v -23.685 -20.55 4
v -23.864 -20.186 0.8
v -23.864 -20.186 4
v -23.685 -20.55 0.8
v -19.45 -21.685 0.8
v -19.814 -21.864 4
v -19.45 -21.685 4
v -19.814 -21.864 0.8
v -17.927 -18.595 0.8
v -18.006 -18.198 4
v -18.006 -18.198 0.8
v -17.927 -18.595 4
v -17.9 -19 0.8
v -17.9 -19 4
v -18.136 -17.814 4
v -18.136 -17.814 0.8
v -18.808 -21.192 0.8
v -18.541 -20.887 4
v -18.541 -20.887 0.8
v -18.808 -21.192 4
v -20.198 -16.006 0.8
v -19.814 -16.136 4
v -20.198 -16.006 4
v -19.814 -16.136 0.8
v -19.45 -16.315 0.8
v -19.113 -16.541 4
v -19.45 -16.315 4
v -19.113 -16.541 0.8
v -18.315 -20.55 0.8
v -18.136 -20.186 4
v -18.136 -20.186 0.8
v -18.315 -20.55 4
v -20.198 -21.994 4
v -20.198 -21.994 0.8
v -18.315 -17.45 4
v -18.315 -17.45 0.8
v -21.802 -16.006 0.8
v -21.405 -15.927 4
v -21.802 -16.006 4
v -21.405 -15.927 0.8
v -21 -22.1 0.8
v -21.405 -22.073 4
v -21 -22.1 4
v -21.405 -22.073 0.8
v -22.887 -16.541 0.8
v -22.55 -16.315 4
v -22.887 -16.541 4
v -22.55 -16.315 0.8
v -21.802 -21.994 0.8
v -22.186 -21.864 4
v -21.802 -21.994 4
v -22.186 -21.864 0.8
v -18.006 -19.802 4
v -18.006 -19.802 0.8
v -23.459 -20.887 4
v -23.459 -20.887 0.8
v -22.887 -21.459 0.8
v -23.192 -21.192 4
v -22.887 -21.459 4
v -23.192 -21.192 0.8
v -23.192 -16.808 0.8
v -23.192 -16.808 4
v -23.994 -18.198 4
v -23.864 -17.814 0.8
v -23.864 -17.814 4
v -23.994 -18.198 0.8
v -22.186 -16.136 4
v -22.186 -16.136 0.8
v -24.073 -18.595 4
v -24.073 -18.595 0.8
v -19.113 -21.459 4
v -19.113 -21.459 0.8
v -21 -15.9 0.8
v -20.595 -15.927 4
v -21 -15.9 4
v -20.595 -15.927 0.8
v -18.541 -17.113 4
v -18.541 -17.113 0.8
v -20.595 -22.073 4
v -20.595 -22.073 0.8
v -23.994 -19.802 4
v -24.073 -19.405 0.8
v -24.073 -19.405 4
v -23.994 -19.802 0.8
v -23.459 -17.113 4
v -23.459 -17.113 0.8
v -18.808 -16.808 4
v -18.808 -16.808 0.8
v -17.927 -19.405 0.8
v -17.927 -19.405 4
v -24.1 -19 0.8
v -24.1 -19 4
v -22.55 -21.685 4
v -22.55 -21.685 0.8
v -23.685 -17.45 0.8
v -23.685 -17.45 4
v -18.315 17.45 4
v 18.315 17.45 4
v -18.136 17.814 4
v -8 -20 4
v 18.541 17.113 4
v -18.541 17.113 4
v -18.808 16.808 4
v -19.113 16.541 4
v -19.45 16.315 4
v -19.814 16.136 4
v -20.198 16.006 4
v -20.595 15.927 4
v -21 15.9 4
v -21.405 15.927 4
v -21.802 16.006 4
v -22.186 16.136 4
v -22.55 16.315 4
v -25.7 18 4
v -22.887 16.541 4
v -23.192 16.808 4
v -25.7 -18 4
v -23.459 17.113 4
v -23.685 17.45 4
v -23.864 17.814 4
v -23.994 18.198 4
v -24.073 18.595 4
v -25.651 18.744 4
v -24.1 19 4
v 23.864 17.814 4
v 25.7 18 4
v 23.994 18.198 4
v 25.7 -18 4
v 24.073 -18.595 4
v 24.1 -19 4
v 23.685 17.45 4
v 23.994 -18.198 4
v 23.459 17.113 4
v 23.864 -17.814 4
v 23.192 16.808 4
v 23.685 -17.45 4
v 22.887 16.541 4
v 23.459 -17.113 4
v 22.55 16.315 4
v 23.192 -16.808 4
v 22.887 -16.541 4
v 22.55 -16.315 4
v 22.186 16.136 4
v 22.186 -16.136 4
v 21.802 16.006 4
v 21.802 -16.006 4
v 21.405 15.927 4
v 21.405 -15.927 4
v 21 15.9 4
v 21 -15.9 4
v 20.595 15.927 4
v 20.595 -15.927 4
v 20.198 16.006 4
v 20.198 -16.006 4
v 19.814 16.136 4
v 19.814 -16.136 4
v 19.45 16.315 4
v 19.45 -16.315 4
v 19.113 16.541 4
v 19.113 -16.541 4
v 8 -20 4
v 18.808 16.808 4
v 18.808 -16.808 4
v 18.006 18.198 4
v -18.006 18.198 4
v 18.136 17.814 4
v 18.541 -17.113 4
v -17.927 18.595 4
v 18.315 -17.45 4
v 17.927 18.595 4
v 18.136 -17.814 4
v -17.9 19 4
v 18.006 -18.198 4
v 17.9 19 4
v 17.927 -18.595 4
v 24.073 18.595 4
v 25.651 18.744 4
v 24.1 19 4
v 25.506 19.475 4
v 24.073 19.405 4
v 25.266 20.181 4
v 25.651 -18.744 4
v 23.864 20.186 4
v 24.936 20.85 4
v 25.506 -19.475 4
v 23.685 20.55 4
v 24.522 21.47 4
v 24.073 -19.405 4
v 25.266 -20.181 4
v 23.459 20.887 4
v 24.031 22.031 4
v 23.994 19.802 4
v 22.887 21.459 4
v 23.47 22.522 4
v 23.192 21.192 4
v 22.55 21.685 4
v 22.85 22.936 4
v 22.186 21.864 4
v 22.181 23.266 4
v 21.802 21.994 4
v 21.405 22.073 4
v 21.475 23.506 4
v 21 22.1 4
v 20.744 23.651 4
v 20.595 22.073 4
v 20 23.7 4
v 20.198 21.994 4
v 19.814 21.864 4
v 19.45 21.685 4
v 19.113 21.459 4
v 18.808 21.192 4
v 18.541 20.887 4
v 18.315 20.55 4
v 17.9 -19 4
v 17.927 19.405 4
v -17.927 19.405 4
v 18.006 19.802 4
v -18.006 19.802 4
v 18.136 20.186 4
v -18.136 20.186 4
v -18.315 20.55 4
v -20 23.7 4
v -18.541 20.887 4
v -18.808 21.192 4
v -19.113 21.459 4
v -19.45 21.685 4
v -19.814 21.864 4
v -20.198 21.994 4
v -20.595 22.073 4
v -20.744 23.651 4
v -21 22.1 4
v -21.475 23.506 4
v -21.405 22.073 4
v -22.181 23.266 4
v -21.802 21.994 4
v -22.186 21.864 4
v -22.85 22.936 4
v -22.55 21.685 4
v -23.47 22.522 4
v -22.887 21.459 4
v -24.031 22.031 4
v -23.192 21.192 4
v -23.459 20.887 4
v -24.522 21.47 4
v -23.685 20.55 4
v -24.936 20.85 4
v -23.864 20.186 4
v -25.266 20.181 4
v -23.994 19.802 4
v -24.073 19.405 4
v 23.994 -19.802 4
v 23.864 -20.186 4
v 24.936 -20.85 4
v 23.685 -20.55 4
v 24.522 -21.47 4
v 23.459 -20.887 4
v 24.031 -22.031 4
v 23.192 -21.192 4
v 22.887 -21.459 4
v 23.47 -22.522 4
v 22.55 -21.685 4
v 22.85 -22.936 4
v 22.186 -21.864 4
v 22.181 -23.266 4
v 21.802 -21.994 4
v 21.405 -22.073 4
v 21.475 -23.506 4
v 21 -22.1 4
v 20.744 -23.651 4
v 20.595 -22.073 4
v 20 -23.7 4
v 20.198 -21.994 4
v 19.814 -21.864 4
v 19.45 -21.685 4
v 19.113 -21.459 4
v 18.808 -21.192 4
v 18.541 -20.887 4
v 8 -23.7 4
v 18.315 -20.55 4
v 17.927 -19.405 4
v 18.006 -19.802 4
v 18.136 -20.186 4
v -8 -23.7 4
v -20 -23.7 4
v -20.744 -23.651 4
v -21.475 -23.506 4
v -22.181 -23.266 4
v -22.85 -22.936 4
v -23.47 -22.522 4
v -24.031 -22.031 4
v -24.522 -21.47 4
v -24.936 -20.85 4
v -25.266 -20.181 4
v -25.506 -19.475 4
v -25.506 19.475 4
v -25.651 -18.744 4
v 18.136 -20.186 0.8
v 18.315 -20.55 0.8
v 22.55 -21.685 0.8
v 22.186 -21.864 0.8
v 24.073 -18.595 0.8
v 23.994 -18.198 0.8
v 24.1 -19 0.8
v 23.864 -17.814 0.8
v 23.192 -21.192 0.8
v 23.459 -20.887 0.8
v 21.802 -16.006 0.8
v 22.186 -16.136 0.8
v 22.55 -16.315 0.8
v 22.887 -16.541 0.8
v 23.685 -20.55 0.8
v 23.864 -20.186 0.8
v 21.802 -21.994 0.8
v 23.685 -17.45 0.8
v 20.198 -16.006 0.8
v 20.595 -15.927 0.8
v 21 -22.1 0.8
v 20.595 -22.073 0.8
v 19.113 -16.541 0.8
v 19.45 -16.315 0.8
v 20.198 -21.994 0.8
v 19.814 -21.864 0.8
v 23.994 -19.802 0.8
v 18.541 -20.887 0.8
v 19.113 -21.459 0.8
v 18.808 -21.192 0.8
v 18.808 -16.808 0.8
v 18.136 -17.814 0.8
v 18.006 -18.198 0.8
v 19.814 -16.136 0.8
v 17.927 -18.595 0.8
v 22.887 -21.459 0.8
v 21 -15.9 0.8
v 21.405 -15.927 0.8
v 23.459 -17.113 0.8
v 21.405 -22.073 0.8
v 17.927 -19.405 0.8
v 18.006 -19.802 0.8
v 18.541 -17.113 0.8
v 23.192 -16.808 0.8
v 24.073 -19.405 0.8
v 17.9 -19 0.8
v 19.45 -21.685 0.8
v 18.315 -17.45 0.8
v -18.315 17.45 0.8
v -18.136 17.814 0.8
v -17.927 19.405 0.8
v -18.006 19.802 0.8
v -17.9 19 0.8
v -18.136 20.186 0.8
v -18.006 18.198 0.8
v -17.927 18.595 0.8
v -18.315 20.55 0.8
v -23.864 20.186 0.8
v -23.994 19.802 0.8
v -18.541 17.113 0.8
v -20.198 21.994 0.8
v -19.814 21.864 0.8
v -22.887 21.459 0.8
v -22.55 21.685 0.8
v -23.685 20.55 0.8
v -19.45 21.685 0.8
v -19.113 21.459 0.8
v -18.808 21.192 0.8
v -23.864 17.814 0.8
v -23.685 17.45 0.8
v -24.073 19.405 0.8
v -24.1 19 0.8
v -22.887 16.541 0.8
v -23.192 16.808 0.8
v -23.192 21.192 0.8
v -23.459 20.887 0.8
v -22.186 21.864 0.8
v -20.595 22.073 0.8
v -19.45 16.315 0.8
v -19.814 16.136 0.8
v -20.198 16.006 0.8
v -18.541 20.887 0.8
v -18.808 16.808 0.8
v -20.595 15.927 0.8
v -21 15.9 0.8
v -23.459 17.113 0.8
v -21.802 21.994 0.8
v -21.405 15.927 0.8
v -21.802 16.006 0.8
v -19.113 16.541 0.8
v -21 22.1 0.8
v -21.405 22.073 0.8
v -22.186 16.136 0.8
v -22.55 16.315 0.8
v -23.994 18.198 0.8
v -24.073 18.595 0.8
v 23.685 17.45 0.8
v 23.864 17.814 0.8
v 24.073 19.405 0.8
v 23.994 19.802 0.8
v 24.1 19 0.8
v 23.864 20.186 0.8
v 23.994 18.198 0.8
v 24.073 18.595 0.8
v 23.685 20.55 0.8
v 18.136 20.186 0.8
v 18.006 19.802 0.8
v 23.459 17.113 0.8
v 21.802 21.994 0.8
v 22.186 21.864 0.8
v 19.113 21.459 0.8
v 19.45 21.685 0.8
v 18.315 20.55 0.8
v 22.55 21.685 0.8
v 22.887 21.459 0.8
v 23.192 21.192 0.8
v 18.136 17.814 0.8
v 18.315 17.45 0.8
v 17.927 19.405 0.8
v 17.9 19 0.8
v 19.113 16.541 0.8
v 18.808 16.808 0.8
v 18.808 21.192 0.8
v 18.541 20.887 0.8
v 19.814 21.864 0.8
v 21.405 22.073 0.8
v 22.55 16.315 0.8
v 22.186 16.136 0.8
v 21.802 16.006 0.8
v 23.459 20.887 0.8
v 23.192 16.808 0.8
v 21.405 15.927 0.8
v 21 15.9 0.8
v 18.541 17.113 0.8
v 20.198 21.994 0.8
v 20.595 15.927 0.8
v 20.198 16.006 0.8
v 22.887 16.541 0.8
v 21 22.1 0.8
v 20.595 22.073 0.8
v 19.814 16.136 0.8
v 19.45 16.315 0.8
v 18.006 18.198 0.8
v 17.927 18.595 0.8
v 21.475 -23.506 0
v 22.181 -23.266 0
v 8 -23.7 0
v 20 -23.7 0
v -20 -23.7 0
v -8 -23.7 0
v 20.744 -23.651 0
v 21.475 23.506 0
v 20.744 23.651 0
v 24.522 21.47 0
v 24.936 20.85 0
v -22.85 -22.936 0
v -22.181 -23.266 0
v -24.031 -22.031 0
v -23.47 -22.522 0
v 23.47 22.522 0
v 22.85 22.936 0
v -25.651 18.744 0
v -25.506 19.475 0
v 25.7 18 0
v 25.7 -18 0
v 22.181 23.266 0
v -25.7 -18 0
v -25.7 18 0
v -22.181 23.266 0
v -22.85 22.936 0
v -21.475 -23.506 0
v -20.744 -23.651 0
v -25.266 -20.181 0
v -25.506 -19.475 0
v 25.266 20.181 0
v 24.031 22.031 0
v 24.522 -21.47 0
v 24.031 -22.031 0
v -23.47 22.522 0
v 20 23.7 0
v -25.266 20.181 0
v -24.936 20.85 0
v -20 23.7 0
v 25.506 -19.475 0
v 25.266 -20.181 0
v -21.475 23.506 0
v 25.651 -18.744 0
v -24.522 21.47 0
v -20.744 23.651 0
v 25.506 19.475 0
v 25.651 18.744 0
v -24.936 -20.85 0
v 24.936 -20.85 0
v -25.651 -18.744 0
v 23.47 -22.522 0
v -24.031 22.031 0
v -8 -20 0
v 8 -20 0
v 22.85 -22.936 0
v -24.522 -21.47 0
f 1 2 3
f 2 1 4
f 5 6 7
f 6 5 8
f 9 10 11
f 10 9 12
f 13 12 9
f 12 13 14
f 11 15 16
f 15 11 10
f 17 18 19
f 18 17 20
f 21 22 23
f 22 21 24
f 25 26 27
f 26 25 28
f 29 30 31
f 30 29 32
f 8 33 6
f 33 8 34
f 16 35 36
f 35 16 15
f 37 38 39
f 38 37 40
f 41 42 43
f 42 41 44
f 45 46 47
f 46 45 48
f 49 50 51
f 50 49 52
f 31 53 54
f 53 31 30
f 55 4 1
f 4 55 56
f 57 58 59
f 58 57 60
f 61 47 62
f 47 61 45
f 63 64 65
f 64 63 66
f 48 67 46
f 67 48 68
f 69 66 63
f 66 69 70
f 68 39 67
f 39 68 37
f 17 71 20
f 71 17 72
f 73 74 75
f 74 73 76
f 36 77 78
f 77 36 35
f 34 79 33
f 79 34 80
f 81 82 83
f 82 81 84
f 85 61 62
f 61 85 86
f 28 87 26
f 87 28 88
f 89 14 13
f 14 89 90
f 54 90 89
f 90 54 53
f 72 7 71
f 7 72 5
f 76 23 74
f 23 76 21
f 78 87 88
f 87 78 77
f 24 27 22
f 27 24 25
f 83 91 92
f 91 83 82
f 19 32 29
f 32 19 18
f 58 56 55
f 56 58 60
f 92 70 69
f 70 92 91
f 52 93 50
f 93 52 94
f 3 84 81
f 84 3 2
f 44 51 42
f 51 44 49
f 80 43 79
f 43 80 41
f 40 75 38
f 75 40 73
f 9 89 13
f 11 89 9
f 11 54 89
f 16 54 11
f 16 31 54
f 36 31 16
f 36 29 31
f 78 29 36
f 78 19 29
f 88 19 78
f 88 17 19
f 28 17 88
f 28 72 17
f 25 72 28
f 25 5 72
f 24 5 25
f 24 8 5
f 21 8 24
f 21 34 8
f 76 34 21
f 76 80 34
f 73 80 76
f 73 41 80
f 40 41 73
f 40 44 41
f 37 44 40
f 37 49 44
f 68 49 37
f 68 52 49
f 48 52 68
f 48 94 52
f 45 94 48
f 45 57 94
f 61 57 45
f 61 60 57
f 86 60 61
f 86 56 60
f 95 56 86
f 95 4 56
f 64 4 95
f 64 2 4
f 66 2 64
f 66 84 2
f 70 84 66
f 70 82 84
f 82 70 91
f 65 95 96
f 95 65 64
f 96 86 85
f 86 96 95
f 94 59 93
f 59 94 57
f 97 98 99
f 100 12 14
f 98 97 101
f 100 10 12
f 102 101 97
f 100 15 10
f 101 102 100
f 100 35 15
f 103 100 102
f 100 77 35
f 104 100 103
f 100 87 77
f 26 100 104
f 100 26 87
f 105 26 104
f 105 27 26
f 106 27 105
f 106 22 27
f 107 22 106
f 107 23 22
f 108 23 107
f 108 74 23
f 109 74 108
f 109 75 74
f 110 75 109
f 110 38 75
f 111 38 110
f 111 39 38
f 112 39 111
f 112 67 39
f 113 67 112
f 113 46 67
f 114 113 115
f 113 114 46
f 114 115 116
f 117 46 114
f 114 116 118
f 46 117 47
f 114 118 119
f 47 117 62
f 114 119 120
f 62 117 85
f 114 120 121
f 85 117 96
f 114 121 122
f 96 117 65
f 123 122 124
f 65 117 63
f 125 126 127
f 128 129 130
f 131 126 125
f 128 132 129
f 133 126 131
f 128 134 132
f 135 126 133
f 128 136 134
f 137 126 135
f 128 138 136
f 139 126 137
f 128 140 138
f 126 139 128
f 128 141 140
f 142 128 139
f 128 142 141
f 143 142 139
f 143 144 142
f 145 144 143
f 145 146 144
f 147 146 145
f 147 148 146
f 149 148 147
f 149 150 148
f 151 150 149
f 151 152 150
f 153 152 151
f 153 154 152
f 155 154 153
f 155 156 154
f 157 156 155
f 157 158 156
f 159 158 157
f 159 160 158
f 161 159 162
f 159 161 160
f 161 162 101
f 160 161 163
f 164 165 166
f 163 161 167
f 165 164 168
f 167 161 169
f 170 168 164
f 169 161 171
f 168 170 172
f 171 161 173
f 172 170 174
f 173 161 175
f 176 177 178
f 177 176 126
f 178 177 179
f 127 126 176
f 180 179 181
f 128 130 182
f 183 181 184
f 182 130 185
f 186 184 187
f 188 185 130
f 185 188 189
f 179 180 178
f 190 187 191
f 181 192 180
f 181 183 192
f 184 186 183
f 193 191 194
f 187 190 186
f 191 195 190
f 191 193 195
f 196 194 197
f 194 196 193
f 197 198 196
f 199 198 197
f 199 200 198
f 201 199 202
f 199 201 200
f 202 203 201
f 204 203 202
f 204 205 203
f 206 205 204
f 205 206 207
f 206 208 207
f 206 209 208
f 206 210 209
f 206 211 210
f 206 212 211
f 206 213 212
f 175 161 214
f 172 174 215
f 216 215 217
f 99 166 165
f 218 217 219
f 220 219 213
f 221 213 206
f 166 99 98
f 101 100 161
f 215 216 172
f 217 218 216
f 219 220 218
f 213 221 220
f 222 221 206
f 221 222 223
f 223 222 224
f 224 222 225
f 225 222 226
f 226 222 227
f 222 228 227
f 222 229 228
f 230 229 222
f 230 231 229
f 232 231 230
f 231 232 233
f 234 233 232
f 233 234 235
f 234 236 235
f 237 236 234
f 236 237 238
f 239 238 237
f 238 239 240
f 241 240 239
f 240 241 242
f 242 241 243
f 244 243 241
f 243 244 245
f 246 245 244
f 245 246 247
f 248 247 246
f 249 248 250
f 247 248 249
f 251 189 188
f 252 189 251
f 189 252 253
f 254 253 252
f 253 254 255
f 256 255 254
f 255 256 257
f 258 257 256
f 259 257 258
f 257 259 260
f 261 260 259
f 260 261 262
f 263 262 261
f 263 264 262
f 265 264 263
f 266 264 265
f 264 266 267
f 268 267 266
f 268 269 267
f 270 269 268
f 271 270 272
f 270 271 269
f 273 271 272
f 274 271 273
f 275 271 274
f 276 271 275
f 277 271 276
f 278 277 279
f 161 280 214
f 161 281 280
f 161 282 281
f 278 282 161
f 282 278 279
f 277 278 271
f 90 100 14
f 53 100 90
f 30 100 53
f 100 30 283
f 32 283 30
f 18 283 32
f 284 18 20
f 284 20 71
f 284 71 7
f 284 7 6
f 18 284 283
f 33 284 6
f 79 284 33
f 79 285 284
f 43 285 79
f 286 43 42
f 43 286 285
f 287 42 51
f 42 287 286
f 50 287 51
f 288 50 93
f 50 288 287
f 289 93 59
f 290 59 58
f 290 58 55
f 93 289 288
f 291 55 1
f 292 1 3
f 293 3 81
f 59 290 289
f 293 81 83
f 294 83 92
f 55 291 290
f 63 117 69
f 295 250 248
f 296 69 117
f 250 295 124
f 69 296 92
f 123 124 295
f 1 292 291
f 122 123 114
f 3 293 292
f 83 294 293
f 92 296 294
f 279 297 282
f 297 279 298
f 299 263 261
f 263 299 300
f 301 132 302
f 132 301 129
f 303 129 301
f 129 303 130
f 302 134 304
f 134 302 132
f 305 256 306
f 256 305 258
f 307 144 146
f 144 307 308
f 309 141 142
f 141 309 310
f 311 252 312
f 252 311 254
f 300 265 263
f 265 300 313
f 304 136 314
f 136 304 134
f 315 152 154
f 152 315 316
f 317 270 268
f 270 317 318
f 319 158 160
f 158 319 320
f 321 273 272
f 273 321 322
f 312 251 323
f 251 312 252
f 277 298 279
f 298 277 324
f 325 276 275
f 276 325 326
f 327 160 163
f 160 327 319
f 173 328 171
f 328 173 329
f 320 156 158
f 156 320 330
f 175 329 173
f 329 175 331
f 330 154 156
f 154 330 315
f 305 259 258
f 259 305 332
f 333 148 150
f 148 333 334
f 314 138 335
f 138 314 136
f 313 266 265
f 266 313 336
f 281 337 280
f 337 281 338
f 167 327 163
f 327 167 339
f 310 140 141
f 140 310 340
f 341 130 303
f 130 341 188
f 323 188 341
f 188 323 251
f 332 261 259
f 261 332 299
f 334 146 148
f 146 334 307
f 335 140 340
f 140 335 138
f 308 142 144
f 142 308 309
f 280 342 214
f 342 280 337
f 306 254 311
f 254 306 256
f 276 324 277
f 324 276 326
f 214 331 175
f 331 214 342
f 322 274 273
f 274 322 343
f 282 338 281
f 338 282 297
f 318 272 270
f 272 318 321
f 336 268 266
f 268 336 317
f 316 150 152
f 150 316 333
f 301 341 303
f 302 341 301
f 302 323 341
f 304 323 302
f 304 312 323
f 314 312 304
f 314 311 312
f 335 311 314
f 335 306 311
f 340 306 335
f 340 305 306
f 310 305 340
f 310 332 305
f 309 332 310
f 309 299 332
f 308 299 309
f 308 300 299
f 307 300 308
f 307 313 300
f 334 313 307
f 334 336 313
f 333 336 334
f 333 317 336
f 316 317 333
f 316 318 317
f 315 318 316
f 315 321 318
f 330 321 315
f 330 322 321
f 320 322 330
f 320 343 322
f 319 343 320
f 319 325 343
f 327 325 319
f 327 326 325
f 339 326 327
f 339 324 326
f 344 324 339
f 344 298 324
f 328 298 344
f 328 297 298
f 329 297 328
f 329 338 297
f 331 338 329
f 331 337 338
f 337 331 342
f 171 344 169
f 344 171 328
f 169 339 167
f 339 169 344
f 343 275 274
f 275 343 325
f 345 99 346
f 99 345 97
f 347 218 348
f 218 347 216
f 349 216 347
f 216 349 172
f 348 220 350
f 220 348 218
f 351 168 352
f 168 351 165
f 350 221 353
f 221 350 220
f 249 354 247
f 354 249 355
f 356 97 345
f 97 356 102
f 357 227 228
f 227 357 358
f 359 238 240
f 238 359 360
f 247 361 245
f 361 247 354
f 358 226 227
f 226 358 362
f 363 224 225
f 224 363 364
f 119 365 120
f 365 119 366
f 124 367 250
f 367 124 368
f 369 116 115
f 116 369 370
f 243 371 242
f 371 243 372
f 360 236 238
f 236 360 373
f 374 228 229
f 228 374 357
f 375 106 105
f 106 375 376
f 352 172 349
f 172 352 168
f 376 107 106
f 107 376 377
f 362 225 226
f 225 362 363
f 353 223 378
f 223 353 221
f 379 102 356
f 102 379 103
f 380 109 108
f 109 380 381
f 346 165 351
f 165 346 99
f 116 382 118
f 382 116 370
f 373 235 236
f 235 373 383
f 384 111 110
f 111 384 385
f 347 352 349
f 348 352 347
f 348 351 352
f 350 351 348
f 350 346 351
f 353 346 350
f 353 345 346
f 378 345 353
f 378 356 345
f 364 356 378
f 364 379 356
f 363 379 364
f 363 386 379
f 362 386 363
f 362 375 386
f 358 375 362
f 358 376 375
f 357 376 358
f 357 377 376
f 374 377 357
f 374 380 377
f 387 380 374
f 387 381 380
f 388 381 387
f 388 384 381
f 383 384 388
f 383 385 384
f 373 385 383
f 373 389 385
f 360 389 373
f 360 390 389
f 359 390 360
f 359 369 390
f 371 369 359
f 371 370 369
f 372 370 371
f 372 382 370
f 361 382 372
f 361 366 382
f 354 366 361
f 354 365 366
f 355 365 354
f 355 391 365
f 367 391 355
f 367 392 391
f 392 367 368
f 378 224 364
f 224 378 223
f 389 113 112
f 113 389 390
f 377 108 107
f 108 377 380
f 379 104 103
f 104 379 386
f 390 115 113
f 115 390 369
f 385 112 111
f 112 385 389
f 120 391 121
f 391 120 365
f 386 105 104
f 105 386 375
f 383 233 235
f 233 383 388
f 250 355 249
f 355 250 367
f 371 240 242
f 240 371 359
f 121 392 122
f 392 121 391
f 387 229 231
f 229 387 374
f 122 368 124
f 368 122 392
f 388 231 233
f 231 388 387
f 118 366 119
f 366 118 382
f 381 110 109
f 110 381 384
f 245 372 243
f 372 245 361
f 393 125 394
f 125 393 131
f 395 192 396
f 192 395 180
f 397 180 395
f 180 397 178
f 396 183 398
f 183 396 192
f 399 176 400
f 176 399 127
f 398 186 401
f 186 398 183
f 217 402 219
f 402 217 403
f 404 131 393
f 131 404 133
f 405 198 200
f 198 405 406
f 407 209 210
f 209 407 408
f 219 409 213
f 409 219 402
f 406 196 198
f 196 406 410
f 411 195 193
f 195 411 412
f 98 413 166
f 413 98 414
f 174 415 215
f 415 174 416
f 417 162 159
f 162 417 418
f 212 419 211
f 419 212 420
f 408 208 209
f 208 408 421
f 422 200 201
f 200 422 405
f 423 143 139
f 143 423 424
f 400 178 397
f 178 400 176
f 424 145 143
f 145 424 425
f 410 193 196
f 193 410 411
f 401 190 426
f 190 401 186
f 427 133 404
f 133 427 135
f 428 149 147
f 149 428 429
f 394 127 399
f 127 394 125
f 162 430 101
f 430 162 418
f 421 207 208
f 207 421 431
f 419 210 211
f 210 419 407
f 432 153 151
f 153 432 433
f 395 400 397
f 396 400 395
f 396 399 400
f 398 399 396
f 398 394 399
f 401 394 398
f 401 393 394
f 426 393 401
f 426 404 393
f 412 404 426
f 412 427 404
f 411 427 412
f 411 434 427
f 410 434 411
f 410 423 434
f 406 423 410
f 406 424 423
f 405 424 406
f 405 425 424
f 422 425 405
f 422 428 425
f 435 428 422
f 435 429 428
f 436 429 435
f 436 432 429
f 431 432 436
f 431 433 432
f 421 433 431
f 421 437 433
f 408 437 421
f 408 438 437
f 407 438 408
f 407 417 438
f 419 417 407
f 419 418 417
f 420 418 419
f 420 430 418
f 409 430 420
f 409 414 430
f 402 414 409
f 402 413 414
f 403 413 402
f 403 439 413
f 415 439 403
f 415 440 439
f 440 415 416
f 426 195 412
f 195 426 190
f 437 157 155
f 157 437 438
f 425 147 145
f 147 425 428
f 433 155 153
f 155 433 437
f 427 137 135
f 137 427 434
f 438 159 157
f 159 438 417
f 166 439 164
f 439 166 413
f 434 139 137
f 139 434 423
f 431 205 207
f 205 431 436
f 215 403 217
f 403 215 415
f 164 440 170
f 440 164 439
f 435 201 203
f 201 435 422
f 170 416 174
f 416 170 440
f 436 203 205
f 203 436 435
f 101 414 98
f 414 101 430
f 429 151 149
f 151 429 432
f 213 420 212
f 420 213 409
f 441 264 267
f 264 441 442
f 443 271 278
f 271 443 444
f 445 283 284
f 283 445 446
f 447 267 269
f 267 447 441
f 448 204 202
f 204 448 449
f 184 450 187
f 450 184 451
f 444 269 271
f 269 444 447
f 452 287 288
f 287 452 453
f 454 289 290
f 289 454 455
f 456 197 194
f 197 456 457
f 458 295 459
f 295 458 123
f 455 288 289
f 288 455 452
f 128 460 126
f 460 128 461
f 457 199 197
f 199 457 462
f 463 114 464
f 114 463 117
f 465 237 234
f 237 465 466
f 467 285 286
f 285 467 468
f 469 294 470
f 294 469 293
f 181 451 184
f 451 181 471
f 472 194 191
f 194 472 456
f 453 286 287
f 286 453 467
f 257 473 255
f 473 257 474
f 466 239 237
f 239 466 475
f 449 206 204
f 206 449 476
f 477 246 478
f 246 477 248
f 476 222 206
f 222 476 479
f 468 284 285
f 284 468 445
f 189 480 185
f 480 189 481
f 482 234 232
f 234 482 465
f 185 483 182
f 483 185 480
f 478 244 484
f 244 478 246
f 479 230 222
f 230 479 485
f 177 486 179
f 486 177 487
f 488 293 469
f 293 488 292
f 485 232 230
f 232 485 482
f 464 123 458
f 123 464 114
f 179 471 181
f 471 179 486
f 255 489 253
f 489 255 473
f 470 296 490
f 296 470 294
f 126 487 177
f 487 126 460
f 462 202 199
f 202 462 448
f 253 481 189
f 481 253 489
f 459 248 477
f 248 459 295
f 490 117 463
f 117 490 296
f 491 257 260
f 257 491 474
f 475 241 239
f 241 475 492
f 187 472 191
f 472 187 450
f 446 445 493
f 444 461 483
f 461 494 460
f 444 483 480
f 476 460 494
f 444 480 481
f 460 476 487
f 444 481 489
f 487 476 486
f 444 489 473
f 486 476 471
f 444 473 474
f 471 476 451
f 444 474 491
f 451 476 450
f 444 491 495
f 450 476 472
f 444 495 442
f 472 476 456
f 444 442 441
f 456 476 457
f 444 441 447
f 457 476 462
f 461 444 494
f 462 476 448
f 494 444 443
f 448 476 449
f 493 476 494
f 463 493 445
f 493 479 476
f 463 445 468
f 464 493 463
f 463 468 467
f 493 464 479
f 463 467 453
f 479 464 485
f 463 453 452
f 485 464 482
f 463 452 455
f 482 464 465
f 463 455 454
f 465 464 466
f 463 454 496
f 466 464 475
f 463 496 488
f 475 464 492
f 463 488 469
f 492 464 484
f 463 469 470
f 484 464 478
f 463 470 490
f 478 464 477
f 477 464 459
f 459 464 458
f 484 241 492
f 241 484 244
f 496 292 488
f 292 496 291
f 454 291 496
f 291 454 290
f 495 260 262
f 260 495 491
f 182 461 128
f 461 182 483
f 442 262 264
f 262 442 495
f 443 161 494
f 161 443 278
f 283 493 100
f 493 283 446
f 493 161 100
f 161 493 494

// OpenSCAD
// file: ../config.scad
// Sparky - shared parameters and the module interface spec.
// All dimensions in mm. Origin: centre of the footprint, on the table.
// +X = right, +Y = back, -Y = front (screen side), +Z = up.
//
// Values marked (measure) are estimates; measure your parts and edit here.

$fn = 48;

// ---------- Interface (keep fixed so modules stay swappable) ----------
outer_w   = 56;     // footprint width
outer_d   = 52;     // footprint depth
corner_r  = 8;      // vertical corner radius of shell, collar and base
wall      = 2;      // shell wall
clear     = 0.3;    // fit clearance between printed parts

base_h    = 12;     // battery base height (deck top)
deck_t    = 2;      // base deck thickness
collar_h  = 4;      // interface collar band
ridge_h   = 2;      // locating ridge on top of the collar
shell_z0  = base_h + collar_h;  // 16, bottom of the shell
shell_z1  = 70;     // top of the shell

// Magnets: 6 x 3 mm neodymium discs, all N faces pointing up.
mag_d     = 6.2;    // pocket diameter (magnet 6.0)
mag_h     = 3.2;    // pocket depth (magnet 3.0)
boss_d    = 9;

mag_base_rack  = [[-21,-14],[21,-14],[-21,16],[21,16]];   // base deck <-> rack floor
mag_rack_shell = [[-18,-15],[18,-15],[-18,17],[18,17]];   // rack crown <-> shell ceiling
mag_lid        = [[-21,-19],[21,-19],[-21,19],[21,19]];   // lid <-> base
collar_pins    = [[-25.9,0],[25.9,0],[0,-23.9],[0,23.9]];
pin_hole  = 1.95;   // locating pins: short pieces of 1.75 mm filament
pin_depth = 3;

// ---------- Inner rack ----------
rack_z0   = base_h;  // 12, sits on the base deck
rack_w    = 47.2;
rack_d    = 43.2;
rack_t    = 3;       // structural wall thickness (PLA: keep >= 3)
crown_z   = 62;      // crown plate bottom (top = 65)
shelf_z   = 21;      // ESP32 shelf bottom (top = 24)

// ---------- Components (measure) ----------
oled_hole_dx = 30.4;           // 1.3" OLED mounting holes, centre to centre
oled_hole_dz = 28.4;
oled_hole_z  = 45;             // centre height of the OLED
m2_pilot     = 1.8;            // pilot hole for M2 self-tapping screws

screen_w  = 34;  screen_h = 24;  screen_z = 34;   // window in the shell
led_z     = 20;  led_d    = 5.2;
mic_y     = -7;  mic_hole = 1.2;
usb_w     = 12;  usb_h    = 7;   usb_z    = 33;
sw_x      = 13.5; sw_w    = 8;   sw_h     = 4;   sw_z = 30;
spk_slots = 5;   spk_y0   = -9;  spk_pitch = 3.5; spk_slot_w = 1.6;
spk_z0    = 24;  spk_z1   = 56;

battery   = [30, 40, 5];       // LiPo 503040 (measure)
lid_t     = 4;

// ---------- Helpers ----------
module rrect2d(w, d, r) { offset(r) square([w - 2*r, d - 2*r], center = true); }
module rrect(w, d, r, h) { linear_extrude(h) rrect2d(w, d, r); }
module rbox(w, d, h, r) {      // box with every edge rounded, z from 0 to h
  hull() for (x = [-1,1], y = [-1,1], z = [r, h - r])
    translate([x*(w/2 - r), y*(d/2 - r), z]) sphere(r);
}
module mag_pocket(z) { translate([0,0,z]) cylinder(d = mag_d, h = mag_h); }
// main file
// Battery lid: held by 4 magnets, finger notch at the front.
include <../config.scad>

module lid() {
  difference() {
    rrect(outer_w - 4 - 2*clear, outer_d - 4 - 2*clear, corner_r - 2 - clear, lid_t);
    for (p = mag_lid) translate([p[0], p[1], 0]) mag_pocket(lid_t - mag_h);
    translate([-8, -outer_d/2, -1]) cube([16, 6, lid_t + 2]);   // finger notch
  }
}

lid();
